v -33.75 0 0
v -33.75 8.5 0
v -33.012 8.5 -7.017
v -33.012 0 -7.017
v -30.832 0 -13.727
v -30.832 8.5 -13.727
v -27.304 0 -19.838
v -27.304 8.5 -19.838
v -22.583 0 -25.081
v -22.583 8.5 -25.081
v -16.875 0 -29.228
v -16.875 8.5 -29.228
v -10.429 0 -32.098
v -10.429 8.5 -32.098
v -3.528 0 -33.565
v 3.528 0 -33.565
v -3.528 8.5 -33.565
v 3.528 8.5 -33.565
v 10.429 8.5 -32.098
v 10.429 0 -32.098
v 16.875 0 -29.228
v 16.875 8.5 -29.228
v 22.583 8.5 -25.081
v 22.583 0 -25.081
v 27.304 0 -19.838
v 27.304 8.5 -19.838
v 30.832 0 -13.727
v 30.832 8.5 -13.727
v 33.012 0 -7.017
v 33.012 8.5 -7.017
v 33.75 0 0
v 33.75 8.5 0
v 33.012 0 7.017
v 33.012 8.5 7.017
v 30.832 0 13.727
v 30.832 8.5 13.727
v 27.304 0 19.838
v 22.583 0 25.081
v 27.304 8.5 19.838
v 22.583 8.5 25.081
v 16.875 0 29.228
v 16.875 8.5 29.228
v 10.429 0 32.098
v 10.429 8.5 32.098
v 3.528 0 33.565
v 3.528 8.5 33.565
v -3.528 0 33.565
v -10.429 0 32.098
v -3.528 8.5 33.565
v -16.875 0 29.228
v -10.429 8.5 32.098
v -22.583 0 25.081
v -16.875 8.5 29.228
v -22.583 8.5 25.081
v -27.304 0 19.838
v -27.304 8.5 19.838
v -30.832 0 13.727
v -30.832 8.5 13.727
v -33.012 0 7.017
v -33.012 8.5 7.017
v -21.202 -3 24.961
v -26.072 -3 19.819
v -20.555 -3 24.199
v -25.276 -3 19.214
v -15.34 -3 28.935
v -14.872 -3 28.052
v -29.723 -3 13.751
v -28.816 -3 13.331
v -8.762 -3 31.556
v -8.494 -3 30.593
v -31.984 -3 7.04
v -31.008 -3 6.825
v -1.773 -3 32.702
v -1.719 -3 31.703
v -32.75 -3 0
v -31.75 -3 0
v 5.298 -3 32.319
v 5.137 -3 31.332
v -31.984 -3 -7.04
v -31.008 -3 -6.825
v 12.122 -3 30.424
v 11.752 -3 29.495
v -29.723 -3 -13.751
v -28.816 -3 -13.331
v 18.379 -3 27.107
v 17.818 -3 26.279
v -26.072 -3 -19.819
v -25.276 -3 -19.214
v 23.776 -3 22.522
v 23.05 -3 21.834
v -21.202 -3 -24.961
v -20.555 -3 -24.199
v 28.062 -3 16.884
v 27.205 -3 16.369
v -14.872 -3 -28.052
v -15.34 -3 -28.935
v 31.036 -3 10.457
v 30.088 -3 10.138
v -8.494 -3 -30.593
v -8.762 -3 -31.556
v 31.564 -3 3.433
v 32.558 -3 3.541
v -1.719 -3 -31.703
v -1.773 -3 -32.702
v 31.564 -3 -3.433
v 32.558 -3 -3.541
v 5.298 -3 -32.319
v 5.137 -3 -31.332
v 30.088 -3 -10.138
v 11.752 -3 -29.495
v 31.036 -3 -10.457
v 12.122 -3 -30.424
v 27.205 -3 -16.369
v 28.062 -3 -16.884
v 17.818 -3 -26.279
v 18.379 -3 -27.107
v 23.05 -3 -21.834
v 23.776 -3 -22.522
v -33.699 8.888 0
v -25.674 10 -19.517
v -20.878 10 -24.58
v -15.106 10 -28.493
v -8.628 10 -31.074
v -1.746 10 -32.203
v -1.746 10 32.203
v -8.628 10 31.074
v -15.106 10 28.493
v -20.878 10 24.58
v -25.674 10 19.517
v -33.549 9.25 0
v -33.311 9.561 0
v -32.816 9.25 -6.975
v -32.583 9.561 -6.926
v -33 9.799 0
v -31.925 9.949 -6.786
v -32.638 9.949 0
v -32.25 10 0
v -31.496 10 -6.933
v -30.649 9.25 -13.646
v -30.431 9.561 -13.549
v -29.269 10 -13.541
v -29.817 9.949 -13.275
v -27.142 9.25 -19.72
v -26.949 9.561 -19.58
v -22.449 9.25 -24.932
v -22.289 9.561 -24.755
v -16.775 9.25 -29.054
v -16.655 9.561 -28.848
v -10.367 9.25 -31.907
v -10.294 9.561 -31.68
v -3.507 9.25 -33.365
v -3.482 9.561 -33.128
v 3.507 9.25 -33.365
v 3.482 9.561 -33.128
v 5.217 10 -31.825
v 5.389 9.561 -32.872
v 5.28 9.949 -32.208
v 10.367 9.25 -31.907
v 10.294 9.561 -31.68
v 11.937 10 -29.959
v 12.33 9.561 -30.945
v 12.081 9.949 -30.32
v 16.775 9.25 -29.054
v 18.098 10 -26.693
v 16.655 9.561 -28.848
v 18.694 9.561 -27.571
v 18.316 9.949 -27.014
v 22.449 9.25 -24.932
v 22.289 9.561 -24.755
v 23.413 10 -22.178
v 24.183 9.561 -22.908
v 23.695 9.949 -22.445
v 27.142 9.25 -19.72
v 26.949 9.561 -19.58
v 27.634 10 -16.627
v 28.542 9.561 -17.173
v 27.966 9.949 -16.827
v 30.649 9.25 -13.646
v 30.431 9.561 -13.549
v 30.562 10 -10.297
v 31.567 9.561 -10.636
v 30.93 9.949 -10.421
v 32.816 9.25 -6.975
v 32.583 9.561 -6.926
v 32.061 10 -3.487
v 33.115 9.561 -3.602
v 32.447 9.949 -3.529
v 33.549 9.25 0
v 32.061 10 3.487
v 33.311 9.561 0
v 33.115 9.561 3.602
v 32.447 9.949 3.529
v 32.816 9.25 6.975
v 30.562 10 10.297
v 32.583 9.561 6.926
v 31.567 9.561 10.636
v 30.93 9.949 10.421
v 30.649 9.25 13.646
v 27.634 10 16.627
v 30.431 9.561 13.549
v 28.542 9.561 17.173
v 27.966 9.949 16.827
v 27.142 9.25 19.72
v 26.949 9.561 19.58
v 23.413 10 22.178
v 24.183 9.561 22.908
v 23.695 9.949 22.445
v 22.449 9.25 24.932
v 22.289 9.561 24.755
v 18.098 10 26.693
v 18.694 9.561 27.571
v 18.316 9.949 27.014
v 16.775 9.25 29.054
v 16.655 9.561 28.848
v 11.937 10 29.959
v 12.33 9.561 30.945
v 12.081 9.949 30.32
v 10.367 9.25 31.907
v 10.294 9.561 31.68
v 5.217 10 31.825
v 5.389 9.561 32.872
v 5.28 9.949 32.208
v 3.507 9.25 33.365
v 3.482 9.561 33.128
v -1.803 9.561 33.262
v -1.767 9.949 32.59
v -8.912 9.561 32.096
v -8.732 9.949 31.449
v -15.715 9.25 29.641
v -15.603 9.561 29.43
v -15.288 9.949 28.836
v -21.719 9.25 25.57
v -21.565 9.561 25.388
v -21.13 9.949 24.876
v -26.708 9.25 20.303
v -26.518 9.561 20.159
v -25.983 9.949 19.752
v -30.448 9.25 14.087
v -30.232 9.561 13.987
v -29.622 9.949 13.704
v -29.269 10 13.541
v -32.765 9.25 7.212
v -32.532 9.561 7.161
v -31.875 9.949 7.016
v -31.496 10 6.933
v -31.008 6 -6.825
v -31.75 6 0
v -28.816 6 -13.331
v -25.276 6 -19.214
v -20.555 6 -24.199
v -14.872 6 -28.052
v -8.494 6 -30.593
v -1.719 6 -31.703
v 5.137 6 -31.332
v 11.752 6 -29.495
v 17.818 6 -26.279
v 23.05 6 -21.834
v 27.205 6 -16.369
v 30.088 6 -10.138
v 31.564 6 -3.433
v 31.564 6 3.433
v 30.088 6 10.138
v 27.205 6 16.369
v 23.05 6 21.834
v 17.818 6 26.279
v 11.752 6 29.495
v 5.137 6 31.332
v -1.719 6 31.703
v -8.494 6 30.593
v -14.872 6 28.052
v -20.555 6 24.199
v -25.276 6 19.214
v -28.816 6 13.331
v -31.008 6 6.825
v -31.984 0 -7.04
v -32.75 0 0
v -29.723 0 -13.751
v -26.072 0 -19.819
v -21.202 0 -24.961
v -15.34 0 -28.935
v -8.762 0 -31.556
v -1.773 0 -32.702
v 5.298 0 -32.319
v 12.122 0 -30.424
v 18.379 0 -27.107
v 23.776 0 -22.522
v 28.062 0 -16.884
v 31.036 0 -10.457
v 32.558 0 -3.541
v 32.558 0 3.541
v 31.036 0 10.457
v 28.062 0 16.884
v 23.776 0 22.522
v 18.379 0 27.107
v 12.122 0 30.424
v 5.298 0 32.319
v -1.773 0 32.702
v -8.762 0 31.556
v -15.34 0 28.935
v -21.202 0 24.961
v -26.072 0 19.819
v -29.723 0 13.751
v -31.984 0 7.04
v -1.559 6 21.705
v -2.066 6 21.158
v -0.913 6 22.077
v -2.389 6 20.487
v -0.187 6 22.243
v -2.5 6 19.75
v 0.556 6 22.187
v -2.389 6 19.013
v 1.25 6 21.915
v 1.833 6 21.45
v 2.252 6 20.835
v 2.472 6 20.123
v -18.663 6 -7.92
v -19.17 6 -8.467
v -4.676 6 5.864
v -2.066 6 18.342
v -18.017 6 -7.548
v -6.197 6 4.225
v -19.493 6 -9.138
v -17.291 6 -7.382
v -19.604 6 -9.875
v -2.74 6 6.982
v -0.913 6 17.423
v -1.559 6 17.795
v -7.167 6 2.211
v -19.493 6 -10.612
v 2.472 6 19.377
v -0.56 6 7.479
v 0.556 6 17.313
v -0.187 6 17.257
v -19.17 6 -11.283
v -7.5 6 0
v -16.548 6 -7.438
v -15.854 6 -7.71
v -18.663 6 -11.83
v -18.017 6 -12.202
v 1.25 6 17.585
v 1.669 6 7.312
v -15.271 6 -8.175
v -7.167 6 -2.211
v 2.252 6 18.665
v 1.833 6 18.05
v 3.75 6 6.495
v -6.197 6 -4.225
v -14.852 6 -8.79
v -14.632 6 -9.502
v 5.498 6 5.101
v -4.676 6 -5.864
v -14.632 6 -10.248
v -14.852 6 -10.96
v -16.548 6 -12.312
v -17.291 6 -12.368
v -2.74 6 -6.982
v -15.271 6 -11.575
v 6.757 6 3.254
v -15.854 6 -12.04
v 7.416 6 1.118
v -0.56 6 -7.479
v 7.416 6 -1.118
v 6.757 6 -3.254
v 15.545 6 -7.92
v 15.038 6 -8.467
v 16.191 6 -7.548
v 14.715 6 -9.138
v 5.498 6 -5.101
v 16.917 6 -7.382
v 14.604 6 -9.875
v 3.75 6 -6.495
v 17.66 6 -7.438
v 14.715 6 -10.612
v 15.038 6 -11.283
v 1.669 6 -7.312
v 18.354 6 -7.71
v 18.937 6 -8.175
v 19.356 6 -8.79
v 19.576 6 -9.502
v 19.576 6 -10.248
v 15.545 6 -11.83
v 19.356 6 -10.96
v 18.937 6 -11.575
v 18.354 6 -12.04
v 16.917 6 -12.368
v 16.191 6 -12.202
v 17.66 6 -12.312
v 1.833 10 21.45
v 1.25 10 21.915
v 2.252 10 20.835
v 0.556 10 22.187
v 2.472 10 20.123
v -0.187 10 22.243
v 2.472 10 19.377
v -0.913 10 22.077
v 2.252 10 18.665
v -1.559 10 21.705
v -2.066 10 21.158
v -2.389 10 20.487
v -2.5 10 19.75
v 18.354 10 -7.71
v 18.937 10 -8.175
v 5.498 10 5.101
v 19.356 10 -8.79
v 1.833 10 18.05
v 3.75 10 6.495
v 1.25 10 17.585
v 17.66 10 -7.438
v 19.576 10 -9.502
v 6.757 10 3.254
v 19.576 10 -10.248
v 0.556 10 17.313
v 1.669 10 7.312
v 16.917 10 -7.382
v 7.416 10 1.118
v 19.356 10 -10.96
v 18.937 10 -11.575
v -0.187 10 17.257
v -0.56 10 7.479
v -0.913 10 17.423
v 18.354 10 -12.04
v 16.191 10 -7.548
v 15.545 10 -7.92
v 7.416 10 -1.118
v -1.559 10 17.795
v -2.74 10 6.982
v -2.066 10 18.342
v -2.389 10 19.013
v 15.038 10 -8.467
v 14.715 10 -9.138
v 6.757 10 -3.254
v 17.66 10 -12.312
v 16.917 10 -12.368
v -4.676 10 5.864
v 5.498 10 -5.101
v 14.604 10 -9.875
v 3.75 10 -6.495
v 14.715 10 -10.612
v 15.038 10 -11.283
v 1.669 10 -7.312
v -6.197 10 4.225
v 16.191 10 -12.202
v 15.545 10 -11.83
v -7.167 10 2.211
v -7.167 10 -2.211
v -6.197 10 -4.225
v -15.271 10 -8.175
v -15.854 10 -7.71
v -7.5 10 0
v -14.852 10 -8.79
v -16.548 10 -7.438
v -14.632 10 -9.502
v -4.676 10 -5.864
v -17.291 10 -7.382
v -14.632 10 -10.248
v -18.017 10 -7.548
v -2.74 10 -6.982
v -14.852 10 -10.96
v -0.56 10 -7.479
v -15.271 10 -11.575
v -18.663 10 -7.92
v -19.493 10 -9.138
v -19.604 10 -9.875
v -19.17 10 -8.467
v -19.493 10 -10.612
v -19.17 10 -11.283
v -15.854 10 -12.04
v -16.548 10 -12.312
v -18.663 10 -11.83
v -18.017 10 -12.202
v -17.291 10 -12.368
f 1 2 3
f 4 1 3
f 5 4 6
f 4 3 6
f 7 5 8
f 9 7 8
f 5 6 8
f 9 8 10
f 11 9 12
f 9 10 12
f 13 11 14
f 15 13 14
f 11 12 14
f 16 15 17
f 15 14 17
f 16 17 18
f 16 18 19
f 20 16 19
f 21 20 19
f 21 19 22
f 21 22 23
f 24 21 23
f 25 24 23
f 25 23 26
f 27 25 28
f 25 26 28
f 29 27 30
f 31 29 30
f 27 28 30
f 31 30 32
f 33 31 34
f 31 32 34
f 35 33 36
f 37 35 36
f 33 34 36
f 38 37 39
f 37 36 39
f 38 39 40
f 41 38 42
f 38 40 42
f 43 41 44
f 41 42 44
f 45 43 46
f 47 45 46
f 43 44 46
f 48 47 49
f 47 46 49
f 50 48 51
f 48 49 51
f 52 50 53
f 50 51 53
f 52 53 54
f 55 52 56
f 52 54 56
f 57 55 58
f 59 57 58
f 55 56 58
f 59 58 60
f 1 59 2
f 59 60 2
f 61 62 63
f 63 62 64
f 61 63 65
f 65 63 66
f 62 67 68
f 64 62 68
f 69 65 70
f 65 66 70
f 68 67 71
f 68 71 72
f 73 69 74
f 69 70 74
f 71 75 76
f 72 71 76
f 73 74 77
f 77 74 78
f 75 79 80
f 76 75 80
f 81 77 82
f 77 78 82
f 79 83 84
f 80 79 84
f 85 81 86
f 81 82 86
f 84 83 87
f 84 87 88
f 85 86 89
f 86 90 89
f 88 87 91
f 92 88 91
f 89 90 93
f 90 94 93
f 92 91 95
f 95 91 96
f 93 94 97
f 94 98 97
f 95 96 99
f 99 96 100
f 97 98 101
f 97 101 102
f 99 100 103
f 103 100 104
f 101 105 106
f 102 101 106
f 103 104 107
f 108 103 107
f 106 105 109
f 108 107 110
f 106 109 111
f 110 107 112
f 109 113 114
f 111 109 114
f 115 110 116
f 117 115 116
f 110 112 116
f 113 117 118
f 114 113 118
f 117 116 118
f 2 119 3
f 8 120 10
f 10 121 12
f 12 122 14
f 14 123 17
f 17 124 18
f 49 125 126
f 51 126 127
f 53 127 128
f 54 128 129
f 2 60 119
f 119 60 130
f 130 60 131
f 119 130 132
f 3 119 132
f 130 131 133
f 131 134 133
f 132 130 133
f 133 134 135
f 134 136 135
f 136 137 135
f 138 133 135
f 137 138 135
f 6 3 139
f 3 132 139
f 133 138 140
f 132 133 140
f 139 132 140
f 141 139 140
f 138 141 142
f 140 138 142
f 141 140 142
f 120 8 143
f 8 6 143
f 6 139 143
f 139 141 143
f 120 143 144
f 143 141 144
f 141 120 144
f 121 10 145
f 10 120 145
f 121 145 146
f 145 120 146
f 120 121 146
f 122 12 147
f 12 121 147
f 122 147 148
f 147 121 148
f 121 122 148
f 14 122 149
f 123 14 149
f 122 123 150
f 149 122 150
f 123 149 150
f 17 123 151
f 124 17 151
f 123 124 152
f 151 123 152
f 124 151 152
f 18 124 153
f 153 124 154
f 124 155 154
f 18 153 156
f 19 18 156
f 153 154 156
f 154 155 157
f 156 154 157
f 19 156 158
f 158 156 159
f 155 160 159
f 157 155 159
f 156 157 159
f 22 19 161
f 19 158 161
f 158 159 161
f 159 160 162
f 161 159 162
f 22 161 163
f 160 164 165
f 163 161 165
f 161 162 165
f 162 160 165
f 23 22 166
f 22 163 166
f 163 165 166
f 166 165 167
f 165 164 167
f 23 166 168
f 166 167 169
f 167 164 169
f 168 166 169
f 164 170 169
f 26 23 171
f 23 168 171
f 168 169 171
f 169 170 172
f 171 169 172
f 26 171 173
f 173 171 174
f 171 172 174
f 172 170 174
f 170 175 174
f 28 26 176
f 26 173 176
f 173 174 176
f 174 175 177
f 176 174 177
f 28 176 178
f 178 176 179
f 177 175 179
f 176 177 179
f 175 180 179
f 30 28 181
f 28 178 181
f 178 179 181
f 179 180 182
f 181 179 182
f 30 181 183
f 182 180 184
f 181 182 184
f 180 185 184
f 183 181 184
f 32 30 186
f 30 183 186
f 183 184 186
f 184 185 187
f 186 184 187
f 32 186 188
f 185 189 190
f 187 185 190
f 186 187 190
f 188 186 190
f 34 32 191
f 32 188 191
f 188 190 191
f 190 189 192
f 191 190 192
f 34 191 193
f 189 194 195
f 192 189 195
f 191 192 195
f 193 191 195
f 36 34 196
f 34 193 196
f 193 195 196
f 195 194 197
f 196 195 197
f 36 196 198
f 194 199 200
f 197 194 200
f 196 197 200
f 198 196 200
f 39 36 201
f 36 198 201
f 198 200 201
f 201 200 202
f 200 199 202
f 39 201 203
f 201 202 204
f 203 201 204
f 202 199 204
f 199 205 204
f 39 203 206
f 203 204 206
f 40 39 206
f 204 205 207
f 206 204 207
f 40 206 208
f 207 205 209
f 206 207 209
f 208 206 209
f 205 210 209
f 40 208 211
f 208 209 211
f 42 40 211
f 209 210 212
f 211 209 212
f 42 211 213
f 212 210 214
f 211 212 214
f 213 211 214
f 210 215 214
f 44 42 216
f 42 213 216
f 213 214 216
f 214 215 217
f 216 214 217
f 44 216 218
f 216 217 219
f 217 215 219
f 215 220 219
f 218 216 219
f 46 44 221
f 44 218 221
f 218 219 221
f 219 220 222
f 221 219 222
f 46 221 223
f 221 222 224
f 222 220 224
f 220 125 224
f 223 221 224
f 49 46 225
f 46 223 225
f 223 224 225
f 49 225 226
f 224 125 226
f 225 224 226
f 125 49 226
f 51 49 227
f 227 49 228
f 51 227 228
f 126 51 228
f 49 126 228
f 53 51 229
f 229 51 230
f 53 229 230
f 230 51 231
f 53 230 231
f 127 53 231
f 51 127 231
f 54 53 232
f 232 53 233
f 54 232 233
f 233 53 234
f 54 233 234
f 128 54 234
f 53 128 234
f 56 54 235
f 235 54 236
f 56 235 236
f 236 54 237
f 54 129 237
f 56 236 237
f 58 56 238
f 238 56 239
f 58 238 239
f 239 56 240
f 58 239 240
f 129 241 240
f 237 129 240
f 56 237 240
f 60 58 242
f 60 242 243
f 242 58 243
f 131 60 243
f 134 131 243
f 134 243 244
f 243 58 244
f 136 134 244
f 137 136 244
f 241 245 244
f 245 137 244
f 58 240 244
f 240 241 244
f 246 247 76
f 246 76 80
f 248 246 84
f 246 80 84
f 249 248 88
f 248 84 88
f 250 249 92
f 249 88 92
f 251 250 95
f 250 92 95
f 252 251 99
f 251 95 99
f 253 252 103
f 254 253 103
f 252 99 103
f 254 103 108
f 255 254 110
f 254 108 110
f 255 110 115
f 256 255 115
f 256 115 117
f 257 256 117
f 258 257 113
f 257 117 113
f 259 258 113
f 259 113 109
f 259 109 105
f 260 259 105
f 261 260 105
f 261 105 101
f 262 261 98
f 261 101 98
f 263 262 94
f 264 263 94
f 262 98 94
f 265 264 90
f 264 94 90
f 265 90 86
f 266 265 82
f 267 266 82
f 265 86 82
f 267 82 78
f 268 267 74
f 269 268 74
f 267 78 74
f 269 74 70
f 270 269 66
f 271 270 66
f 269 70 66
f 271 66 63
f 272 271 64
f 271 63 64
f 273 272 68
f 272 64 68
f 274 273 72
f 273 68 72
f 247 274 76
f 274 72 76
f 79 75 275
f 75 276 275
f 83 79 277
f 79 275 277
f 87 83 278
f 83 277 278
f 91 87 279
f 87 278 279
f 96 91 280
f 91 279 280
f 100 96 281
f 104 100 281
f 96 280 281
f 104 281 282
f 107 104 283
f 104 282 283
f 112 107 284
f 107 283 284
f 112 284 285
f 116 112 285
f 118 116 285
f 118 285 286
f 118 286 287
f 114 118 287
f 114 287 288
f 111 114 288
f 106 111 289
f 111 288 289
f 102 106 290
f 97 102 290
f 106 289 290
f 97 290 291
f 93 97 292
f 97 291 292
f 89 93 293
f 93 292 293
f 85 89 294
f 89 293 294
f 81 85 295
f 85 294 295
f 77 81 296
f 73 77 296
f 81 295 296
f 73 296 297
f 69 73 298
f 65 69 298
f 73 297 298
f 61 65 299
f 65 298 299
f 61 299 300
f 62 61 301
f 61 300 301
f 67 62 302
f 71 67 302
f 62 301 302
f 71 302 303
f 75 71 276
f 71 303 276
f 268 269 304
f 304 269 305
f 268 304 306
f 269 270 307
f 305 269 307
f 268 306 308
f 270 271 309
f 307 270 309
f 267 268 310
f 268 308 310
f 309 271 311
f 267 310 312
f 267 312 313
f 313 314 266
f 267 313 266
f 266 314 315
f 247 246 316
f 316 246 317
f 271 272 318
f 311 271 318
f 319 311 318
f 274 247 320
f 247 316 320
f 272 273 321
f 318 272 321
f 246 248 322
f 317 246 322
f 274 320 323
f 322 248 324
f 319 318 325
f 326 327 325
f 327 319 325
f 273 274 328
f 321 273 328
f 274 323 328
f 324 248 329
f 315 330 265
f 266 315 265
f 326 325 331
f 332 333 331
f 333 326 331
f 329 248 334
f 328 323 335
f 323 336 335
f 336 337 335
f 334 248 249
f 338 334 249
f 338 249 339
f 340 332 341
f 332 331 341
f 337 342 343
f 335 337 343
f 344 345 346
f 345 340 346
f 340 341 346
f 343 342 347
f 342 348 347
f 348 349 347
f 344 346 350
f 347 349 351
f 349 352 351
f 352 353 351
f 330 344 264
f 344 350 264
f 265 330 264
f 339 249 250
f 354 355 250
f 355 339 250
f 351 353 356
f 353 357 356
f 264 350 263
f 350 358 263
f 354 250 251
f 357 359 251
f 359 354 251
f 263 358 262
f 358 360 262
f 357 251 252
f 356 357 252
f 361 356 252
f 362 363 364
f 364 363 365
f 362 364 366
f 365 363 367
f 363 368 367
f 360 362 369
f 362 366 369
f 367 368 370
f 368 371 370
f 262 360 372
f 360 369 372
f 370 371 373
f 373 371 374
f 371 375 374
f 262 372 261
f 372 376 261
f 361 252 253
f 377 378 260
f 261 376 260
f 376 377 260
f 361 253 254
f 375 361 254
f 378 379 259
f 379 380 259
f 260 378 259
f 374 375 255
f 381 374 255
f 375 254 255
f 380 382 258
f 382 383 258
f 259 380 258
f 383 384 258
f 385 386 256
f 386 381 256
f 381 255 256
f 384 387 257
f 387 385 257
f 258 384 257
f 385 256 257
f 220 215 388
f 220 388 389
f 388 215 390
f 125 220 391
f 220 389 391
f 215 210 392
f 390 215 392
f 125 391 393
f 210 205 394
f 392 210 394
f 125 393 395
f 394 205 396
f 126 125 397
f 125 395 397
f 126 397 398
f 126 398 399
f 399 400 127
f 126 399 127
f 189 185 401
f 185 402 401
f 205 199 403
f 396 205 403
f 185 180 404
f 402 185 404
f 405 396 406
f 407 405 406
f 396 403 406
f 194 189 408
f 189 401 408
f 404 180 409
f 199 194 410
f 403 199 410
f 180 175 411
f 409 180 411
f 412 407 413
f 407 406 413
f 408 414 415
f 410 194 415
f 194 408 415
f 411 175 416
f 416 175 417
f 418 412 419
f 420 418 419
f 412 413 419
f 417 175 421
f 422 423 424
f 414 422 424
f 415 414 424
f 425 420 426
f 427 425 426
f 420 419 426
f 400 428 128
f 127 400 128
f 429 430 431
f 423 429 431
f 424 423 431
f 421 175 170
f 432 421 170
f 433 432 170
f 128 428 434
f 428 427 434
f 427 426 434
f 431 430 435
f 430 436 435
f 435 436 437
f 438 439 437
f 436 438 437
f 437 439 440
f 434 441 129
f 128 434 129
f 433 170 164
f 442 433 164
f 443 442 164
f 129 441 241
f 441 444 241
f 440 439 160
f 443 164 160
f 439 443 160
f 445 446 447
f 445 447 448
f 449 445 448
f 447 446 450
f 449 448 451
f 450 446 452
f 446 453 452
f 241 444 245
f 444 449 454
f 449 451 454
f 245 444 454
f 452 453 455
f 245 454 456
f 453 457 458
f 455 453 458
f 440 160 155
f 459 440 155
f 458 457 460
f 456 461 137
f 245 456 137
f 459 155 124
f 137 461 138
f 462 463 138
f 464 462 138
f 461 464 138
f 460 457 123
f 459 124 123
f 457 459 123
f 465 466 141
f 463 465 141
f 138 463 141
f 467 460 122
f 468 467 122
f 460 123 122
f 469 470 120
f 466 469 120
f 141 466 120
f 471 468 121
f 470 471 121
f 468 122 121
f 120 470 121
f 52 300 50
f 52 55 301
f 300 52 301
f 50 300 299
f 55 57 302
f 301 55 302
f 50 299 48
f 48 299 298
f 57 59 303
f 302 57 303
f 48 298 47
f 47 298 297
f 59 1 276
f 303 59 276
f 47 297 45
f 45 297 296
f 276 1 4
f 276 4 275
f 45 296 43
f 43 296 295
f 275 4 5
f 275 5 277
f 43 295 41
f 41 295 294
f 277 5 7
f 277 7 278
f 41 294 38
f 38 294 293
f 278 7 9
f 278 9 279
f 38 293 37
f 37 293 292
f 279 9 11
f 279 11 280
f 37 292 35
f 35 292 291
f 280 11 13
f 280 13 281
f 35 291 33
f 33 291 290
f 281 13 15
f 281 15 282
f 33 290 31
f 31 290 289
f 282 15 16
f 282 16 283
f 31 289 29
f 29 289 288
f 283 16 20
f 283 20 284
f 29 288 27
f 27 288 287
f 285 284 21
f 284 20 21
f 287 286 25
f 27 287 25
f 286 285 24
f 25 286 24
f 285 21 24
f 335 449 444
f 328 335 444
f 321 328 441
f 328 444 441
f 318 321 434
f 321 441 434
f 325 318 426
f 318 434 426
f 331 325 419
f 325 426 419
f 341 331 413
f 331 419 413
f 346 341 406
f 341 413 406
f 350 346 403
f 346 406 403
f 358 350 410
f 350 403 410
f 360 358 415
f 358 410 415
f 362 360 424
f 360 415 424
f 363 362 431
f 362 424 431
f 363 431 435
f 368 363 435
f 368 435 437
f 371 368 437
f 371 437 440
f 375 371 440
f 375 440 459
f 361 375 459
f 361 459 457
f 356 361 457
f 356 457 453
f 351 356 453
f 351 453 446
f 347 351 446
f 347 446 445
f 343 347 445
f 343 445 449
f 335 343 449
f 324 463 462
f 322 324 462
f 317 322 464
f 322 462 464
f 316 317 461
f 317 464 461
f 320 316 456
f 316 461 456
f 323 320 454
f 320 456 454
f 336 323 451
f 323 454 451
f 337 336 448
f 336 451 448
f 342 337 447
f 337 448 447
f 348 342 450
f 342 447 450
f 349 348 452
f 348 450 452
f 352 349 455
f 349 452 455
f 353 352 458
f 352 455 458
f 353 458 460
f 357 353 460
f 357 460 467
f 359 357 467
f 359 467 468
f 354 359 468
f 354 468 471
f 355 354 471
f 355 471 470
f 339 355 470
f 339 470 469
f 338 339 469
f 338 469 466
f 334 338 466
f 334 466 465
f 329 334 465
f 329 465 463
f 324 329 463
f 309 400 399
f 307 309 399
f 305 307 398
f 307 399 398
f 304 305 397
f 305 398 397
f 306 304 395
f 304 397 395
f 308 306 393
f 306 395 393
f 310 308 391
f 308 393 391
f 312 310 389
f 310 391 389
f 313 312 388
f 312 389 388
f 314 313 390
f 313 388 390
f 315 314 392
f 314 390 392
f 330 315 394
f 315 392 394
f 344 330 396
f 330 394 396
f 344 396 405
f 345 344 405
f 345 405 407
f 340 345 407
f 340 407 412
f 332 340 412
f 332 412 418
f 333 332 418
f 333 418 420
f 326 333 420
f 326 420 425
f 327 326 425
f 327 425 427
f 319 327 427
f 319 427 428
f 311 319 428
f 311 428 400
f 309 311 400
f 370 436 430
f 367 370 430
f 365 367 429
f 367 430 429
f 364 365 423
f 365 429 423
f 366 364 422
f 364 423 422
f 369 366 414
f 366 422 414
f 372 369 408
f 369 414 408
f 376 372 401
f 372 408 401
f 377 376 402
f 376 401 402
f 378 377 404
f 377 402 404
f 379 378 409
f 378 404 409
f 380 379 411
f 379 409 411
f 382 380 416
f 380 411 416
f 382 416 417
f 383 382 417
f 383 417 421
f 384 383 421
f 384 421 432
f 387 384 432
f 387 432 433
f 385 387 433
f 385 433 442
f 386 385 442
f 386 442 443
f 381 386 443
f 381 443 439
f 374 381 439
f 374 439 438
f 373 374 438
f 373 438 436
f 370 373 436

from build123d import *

# Parameters (mm, degrees)
SKETCH2_R          = 2.5
SKETCH2_R_2        = 7.5
CUT_EXTRUDE1_DEPTH = 50.468424272
FILLET1_R          = 1.5


with BuildPart() as part:
    # Sketch1 → Revolve1 (revolve)
    with BuildSketch(Plane.XY):
        Polygon((31.75, -3), (32.75, -3), (32.75, 0), (33.75, 0), (33.75, 10), (0, 10), (0, 6), (31.75, 6), align=None)
    revolve(axis=Axis((0, 10, 0), (0, -1, 0)))

    # Sketch2 → Cut-Extrude1 (cut, through all)
    with BuildSketch(Plane(origin=(0, 10, 0), x_dir=(1, 0, 0), z_dir=(0, 1, 0))):
        with Locations((0, -19.75)):
            Circle(SKETCH2_R)
        with Locations((-17.104001725, 9.875)):
            Circle(SKETCH2_R)
        with Locations((17.104001725, 9.875)):
            Circle(SKETCH2_R)
        Circle(SKETCH2_R_2)
    extrude(amount=-CUT_EXTRUDE1_DEPTH, mode=Mode.SUBTRACT)

    # Fillet1
    fillet1_edges = [part.edges().sort_by_distance(p)[0] for p in [
        (-33.75, 10, 0),
    ]]
    fillet(fillet1_edges, radius=FILLET1_R)


solid = part.part
